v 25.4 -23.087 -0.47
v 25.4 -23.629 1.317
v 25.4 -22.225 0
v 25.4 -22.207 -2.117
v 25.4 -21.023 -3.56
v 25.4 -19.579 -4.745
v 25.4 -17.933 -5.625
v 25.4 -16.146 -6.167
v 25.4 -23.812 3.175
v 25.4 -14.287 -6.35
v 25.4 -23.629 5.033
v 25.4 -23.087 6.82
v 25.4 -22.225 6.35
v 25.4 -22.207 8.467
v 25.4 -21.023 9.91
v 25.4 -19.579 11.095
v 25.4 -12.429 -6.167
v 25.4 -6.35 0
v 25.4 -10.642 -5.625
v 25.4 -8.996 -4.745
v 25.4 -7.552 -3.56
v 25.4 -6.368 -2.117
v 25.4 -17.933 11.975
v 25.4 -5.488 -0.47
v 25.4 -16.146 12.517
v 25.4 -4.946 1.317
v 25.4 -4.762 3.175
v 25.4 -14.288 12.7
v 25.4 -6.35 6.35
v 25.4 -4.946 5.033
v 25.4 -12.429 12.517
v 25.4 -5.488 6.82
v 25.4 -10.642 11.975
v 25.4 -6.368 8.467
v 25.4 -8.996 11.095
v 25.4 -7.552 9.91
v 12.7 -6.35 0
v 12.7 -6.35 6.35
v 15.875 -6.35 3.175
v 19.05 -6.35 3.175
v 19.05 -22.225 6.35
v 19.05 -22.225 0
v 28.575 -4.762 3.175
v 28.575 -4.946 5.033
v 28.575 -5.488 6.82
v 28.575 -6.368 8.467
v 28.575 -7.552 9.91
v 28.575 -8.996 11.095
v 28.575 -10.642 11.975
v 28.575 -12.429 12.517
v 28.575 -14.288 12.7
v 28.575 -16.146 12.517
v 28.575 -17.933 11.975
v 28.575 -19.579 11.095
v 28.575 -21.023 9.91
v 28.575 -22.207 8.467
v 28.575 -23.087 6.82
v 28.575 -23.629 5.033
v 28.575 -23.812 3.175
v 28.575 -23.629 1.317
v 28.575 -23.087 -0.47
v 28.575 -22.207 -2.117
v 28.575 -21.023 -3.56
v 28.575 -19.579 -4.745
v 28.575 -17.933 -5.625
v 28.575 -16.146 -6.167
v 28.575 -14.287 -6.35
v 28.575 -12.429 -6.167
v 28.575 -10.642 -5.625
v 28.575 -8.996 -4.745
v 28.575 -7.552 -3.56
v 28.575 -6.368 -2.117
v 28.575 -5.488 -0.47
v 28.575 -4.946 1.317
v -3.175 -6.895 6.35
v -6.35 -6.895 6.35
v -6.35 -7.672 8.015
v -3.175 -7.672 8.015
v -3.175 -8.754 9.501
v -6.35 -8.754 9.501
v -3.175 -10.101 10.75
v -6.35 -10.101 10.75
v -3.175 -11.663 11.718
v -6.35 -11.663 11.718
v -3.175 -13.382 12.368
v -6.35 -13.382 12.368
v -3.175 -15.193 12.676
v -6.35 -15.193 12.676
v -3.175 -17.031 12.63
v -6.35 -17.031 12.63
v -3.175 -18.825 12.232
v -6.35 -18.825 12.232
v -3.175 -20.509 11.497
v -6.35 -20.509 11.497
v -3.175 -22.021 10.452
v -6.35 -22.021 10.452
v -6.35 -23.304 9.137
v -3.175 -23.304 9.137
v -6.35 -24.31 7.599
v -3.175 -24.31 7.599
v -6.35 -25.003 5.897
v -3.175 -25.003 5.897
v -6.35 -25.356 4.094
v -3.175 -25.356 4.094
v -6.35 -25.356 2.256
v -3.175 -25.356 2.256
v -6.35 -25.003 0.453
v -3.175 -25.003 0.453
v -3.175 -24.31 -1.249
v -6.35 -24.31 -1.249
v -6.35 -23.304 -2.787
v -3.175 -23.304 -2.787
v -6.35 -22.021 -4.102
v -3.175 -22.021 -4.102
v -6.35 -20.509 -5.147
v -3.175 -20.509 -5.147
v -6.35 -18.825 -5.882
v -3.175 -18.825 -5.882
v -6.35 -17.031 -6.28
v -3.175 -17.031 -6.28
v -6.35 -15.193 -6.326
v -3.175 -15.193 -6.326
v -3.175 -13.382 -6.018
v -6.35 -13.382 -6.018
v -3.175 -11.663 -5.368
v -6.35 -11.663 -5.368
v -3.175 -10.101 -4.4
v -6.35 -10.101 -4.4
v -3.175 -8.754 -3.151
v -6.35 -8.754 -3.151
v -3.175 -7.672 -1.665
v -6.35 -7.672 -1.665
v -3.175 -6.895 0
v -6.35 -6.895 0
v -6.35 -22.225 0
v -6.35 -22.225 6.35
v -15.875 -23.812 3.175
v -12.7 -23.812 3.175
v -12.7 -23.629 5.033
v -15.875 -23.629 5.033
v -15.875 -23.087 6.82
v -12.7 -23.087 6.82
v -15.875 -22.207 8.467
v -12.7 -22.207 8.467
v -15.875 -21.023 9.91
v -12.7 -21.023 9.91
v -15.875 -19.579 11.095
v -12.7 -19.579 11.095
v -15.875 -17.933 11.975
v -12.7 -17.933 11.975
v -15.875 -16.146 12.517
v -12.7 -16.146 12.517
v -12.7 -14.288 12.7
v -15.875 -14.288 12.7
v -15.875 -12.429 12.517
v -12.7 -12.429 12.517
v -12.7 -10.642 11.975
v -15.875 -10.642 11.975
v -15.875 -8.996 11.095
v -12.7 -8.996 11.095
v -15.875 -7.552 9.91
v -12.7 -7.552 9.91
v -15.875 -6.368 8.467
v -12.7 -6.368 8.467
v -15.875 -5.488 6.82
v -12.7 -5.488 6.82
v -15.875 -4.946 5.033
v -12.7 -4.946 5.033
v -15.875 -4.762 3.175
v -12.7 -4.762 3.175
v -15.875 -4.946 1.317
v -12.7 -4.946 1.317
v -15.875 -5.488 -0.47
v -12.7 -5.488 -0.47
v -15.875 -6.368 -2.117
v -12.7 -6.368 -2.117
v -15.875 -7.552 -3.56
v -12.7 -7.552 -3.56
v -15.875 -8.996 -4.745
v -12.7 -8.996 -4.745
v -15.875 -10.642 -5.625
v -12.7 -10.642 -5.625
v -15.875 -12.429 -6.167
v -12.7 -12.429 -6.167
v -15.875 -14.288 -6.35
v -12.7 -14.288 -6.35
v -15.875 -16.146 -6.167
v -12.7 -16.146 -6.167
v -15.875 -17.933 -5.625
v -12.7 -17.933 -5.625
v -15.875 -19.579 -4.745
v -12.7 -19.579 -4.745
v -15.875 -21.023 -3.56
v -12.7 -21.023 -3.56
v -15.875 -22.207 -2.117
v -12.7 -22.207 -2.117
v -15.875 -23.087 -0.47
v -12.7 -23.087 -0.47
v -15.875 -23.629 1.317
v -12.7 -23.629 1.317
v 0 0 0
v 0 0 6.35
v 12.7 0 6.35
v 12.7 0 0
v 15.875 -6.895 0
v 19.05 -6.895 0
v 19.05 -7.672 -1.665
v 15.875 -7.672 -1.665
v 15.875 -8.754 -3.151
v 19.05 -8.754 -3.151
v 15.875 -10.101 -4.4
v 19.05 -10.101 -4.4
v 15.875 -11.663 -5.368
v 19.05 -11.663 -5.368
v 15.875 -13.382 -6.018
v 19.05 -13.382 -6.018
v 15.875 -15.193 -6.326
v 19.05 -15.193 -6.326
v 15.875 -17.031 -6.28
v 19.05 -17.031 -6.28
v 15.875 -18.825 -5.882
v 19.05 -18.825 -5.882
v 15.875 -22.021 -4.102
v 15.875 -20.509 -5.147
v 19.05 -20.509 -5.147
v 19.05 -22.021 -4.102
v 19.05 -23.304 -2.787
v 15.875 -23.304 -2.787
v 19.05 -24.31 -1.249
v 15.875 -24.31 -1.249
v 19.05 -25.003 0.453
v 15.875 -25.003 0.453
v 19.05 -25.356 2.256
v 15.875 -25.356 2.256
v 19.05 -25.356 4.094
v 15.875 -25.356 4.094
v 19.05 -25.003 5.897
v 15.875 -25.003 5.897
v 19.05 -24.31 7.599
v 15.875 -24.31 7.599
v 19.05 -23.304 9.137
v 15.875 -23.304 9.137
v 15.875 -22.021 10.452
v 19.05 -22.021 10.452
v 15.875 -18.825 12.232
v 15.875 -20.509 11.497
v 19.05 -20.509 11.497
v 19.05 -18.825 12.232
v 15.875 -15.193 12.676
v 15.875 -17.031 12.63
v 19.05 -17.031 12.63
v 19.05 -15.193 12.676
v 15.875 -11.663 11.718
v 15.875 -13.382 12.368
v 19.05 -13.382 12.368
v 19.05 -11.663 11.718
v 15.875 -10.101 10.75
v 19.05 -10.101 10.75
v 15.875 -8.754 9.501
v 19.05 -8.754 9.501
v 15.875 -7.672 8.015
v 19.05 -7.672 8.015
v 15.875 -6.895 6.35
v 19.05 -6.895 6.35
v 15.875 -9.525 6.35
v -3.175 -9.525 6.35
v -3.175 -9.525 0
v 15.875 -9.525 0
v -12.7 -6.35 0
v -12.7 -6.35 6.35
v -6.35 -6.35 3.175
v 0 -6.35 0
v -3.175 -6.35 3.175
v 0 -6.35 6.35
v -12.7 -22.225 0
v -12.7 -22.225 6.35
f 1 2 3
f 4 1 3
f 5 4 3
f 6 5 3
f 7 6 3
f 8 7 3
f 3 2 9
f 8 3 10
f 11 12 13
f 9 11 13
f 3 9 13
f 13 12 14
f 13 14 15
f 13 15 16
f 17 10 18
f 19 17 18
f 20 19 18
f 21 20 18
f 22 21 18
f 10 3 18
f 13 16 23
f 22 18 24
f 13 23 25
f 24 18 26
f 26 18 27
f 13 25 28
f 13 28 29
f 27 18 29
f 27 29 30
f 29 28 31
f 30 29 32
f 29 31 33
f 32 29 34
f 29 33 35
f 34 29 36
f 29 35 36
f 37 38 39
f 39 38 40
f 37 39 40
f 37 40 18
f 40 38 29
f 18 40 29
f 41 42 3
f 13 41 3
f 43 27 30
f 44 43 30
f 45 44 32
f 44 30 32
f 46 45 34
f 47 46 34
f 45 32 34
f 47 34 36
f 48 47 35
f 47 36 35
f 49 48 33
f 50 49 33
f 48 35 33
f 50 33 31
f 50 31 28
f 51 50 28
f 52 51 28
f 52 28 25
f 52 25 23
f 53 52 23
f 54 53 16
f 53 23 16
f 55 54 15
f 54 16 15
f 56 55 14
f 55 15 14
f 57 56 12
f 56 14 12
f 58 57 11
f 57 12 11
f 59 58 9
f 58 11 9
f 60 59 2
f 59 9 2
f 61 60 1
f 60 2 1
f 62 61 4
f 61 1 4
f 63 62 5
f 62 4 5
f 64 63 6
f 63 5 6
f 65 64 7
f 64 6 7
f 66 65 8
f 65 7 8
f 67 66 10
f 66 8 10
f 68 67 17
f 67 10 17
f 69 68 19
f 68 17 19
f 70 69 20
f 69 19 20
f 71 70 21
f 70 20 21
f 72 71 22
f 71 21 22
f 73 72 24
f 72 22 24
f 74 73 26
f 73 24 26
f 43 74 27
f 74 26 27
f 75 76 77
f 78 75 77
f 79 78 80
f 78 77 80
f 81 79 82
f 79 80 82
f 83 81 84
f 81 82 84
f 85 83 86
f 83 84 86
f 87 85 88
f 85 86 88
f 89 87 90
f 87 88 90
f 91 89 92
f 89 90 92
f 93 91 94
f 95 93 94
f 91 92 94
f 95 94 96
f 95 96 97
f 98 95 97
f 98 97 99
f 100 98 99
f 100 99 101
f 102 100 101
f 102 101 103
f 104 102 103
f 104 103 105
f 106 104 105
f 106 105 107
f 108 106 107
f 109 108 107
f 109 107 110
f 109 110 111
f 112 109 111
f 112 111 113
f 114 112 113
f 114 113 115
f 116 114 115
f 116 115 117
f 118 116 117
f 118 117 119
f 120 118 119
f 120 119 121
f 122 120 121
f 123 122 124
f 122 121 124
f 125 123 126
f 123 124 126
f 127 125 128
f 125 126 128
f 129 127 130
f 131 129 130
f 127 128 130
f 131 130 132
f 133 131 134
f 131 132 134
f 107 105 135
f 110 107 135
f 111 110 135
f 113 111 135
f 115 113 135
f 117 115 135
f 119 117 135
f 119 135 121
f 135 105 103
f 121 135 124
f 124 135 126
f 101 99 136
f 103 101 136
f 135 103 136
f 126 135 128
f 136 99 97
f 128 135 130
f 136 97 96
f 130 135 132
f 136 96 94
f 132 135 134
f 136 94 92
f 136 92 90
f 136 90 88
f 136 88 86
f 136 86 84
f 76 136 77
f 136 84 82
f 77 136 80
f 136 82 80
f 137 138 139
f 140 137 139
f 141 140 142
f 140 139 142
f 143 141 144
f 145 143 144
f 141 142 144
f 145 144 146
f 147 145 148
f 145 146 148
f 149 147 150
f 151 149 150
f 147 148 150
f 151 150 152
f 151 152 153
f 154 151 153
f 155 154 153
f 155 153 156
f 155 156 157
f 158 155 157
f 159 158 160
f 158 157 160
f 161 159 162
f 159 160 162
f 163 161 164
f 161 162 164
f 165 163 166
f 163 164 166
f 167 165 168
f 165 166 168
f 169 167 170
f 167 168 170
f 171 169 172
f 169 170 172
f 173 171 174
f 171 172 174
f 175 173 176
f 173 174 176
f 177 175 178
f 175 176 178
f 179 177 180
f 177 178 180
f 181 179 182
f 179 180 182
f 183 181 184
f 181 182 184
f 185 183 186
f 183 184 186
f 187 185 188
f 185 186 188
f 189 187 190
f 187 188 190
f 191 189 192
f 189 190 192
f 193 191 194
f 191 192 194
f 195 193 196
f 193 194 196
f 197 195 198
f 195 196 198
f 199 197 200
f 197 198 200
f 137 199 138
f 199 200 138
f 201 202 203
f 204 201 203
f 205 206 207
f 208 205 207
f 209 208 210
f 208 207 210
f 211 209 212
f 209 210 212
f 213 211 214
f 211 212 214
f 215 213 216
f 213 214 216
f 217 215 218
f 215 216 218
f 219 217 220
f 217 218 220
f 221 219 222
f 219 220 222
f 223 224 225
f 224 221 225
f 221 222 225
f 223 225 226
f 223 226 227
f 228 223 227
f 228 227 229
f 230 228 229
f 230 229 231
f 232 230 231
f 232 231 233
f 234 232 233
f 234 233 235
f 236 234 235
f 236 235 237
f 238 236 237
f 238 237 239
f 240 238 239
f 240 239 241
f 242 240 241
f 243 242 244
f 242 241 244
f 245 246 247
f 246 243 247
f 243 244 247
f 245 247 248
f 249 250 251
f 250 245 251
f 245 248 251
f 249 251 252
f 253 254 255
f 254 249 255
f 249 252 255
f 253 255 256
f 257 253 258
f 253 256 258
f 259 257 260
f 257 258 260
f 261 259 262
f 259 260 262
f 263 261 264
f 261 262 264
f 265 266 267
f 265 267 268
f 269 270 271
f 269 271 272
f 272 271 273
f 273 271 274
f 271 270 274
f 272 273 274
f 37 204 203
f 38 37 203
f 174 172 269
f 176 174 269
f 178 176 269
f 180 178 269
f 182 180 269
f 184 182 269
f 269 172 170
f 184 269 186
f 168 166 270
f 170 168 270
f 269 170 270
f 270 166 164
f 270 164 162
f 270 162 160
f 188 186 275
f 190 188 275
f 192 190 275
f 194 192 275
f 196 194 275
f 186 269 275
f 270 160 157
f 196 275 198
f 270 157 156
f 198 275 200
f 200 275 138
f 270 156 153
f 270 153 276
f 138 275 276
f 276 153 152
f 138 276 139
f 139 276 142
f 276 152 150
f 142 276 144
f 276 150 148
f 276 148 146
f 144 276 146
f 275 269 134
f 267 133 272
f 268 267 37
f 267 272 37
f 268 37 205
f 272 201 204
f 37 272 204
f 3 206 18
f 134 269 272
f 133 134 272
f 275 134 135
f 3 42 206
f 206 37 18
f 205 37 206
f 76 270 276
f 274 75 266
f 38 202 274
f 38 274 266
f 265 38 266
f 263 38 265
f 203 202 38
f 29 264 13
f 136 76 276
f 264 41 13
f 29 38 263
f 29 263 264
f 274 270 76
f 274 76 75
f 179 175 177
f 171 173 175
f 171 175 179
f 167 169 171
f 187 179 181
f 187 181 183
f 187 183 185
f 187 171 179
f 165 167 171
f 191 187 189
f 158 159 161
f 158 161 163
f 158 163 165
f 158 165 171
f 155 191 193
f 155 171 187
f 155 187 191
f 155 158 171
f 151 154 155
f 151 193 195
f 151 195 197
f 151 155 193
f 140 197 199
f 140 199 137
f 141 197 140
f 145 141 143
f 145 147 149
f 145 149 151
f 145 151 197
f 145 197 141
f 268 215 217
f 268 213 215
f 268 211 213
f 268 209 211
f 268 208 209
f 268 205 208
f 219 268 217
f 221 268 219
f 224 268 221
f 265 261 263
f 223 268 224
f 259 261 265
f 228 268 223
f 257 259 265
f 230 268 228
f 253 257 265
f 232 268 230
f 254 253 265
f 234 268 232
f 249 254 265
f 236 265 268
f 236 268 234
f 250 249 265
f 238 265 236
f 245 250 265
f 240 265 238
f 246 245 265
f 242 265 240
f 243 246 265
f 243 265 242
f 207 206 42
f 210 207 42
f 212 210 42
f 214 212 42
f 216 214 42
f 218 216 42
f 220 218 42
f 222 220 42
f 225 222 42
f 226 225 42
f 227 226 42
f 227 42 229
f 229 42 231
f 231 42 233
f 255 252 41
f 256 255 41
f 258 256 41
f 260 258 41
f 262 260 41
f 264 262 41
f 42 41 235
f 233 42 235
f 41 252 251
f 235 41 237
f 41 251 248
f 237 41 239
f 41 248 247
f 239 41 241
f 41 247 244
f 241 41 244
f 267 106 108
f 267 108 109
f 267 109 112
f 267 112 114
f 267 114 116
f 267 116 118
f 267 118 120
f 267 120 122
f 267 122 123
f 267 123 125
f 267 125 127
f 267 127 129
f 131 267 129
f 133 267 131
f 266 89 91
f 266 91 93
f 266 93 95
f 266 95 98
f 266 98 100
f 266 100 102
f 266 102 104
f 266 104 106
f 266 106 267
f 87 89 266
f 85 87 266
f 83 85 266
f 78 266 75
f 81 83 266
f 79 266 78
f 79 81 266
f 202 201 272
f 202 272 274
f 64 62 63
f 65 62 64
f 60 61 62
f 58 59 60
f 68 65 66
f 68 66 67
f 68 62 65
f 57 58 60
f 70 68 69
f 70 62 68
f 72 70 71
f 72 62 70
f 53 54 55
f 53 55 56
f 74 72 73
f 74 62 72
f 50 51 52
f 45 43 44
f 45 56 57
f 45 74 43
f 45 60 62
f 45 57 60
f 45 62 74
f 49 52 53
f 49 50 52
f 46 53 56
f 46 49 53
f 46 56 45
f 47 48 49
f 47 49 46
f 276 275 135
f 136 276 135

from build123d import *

# Parameters (mm, degrees)
F0_W      = 12.7
F0_H      = 6.35
F1_DEPTH  = 6.35
F2_W      = 12.7
F2_H      = 6.35
F3_DEPTH  = 3.175
F4_W      = 6.35
F4_H      = 6.35
F5_DEPTH  = 12.7
F6_R      = 9.525
F6_W      = 15.875
F6_H      = 6.35
F7_DEPTH  = 3.175
F8_R      = 9.525
F9_DEPTH  = 3.175
F10_R     = 9.525
F11_DEPTH = 3.175
F12_R     = 9.525
F13_DEPTH = 3.175


# Not quite as in the source:
# - a feature names something its author has since deleted; it is built from what else it names


with BuildPart() as f1:
    # F0 (on Front) → F1 (new body)
    with BuildSketch(Plane.XZ):
        with Locations((6.35, 3.175)):
            Rectangle(F0_W, F0_H)
    extrude(amount=F1_DEPTH)

    # F2 (on face) → F3 (join)
    with BuildSketch(Plane.XZ.offset(6.35)):
        with Locations((-6.35, 3.175)):
            Rectangle(F2_W, F2_H)
        with Locations((6.35, 3.175)):
            Rectangle(F2_W, F2_H)
        with Locations((19.05, 3.175)):
            Rectangle(F2_W, F2_H)
    extrude(amount=F3_DEPTH)

    # F4 (on face) → F5 (join)
    with BuildSketch(Plane.XZ.offset(9.525)):
        with Locations((-9.525, 3.175)):
            Rectangle(F4_W, F4_H)
        with Locations((22.225, 3.175)):
            Rectangle(F4_W, F4_H)
    extrude(amount=F5_DEPTH)

    # F6 (on face) → F7 (join)
    with BuildSketch(Plane.YZ.offset(25.4)):
        with Locations((-14.2875, 3.175)):
            Circle(F6_R)
        with Locations((-14.2875, 3.175)):
            Rectangle(F6_W, F6_H, mode=Mode.SUBTRACT)
        with Locations((-14.2875, 3.175)):
            Rectangle(F6_W, F6_H)
    extrude(amount=F7_DEPTH)

    # F8 (on face) → F9 (join)
    with BuildSketch(Plane(origin=(-12.7, 0, 0), x_dir=(0, -1, 0), z_dir=(-1, 0, 0))):
        with Locations((14.2875, 3.175)):
            Circle(F8_R)
    extrude(amount=F9_DEPTH)

    # F10 (on face) → F11 (join)
    with BuildSketch(Plane(origin=(19.05, 0, 0), x_dir=(0, -1, 0), z_dir=(-1, 0, 0))):
        with Locations((15.875, 3.175)):
            Circle(F10_R)
    extrude(amount=F11_DEPTH)

    # F12 (on face) → F13 (join)
    with BuildSketch(Plane.YZ.offset(-6.35)):
        with Locations((-15.875, 3.175)):
            Circle(F12_R)
    extrude(amount=F13_DEPTH)


solid = f1.part
